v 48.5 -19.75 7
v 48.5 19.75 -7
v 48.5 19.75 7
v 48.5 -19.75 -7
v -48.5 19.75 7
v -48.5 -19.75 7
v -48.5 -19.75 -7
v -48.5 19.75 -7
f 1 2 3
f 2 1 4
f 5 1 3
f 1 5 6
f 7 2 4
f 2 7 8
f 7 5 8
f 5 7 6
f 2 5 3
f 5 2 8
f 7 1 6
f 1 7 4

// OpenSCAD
// Parameters
module_type = 2004; //[1000:4000:1]
width_mm = 97; //[48.5:194:0.1]
height_mm = 39.5; //[19.75:79:0.1]
thickness_mm = 14; //[7:28:0.1]
include_mounting_holes = 1; //[0:1:1]
include_aperture = 1; //[0:1:1]
include_pcb_volume = 1; //[0:1:1]
overlap_mm = 1; //[0.5:2:0.1]
body_corner_radius_mm = 0.5; //[0:3:0.1]
pcb_thickness_mm = 1.6; //[0.8:3.2:0.1]
pcb_margin_mm = 0; //[0:3:0.1]
aperture_width_mm = 76; //[38:152:0.1]
aperture_height_mm = 25; //[12.5:50:0.1]
aperture_depth_mm = 2; //[1:6:0.1]
aperture_inset_from_front_mm = 0.5; //[0:3:0.1]
glass_width_mm = 70; //[35:140:0.1]
glass_height_mm = 20; //[10:40:0.1]
glass_thickness_mm = 3; //[1.5:8:0.1]
mount_hole_diameter_mm = 3.2; //[2:6.4:0.1]
mount_hole_edge_offset_x_mm = 3.5; //[2:10:0.1]
mount_hole_edge_offset_y_mm = 3.5; //[2:10:0.1]
mount_hole_height_mm = 6; //[3:20:0.1]

// Display module body
module display_module_body() {
  color([0.0, 0.4, 0.2]) // PCB green
  cube([width_mm, height_mm, thickness_mm], center=true);
}

// PCB thickness volume
module pcb_thickness_volume() {
  color([0.1, 0.1, 0.6]) // PCB blue
  translate([0, 0, -thickness_mm/2 + pcb_thickness_mm/2 + overlap_mm])
    cube([width_mm - 2*pcb_margin_mm, height_mm - 2*pcb_margin_mm, pcb_thickness_mm], center=true);
}

// Display aperture window
module display_aperture_window() {
  color("White")
  translate([0, 0, thickness_mm/2 - aperture_inset_from_front_mm - aperture_depth_mm/2 - overlap_mm])
    cube([aperture_width_mm, aperture_height_mm, aperture_depth_mm], center=true);
}

// Display glass
module display() {
  color("Black")
  translate([0, 0, thickness_mm/2 - aperture_inset_from_front_mm - glass_thickness_mm/2 - overlap_mm])
    cube([glass_width_mm, glass_height_mm, glass_thickness_mm], center=true);
}

// Mounting holes
module mounting_hole_pattern() {
  color("Silver")
  union() {
    translate([-width_mm/2 + mount_hole_edge_offset_x_mm, -height_mm/2 + mount_hole_edge_offset_y_mm, -thickness_mm/2 + mount_hole_height_mm/2 + overlap_mm])
      cylinder(r=mount_hole_diameter_mm/2, h=mount_hole_height_mm, center=true);
    translate([width_mm/2 - mount_hole_edge_offset_x_mm, -height_mm/2 + mount_hole_edge_offset_y_mm, -thickness_mm/2 + mount_hole_height_mm/2 + overlap_mm])
      cylinder(r=mount_hole_diameter_mm/2, h=mount_hole_height_mm, center=true);
    translate([-width_mm/2 + mount_hole_edge_offset_x_mm, height_mm/2 - mount_hole_edge_offset_y_mm, -thickness_mm/2 + mount_hole_height_mm/2 + overlap_mm])
      cylinder(r=mount_hole_diameter_mm/2, h=mount_hole_height_mm, center=true);
    translate([width_mm/2 - mount_hole_edge_offset_x_mm, height_mm/2 - mount_hole_edge_offset_y_mm, -thickness_mm/2 + mount_hole_height_mm/2 + overlap_mm])
      cylinder(r=mount_hole_diameter_mm/2, h=mount_hole_height_mm, center=true);
  }
}

// Complete module assembly
module mod() {
  union() {
    display_module_body();
    if (include_pcb_volume) pcb_thickness_volume();
    if (include_aperture) display_aperture_window();
    display();
    if (include_mounting_holes) mounting_hole_pattern();
  }
}

// Final assembly
module assembly() {
  mod();
}

assembly();
